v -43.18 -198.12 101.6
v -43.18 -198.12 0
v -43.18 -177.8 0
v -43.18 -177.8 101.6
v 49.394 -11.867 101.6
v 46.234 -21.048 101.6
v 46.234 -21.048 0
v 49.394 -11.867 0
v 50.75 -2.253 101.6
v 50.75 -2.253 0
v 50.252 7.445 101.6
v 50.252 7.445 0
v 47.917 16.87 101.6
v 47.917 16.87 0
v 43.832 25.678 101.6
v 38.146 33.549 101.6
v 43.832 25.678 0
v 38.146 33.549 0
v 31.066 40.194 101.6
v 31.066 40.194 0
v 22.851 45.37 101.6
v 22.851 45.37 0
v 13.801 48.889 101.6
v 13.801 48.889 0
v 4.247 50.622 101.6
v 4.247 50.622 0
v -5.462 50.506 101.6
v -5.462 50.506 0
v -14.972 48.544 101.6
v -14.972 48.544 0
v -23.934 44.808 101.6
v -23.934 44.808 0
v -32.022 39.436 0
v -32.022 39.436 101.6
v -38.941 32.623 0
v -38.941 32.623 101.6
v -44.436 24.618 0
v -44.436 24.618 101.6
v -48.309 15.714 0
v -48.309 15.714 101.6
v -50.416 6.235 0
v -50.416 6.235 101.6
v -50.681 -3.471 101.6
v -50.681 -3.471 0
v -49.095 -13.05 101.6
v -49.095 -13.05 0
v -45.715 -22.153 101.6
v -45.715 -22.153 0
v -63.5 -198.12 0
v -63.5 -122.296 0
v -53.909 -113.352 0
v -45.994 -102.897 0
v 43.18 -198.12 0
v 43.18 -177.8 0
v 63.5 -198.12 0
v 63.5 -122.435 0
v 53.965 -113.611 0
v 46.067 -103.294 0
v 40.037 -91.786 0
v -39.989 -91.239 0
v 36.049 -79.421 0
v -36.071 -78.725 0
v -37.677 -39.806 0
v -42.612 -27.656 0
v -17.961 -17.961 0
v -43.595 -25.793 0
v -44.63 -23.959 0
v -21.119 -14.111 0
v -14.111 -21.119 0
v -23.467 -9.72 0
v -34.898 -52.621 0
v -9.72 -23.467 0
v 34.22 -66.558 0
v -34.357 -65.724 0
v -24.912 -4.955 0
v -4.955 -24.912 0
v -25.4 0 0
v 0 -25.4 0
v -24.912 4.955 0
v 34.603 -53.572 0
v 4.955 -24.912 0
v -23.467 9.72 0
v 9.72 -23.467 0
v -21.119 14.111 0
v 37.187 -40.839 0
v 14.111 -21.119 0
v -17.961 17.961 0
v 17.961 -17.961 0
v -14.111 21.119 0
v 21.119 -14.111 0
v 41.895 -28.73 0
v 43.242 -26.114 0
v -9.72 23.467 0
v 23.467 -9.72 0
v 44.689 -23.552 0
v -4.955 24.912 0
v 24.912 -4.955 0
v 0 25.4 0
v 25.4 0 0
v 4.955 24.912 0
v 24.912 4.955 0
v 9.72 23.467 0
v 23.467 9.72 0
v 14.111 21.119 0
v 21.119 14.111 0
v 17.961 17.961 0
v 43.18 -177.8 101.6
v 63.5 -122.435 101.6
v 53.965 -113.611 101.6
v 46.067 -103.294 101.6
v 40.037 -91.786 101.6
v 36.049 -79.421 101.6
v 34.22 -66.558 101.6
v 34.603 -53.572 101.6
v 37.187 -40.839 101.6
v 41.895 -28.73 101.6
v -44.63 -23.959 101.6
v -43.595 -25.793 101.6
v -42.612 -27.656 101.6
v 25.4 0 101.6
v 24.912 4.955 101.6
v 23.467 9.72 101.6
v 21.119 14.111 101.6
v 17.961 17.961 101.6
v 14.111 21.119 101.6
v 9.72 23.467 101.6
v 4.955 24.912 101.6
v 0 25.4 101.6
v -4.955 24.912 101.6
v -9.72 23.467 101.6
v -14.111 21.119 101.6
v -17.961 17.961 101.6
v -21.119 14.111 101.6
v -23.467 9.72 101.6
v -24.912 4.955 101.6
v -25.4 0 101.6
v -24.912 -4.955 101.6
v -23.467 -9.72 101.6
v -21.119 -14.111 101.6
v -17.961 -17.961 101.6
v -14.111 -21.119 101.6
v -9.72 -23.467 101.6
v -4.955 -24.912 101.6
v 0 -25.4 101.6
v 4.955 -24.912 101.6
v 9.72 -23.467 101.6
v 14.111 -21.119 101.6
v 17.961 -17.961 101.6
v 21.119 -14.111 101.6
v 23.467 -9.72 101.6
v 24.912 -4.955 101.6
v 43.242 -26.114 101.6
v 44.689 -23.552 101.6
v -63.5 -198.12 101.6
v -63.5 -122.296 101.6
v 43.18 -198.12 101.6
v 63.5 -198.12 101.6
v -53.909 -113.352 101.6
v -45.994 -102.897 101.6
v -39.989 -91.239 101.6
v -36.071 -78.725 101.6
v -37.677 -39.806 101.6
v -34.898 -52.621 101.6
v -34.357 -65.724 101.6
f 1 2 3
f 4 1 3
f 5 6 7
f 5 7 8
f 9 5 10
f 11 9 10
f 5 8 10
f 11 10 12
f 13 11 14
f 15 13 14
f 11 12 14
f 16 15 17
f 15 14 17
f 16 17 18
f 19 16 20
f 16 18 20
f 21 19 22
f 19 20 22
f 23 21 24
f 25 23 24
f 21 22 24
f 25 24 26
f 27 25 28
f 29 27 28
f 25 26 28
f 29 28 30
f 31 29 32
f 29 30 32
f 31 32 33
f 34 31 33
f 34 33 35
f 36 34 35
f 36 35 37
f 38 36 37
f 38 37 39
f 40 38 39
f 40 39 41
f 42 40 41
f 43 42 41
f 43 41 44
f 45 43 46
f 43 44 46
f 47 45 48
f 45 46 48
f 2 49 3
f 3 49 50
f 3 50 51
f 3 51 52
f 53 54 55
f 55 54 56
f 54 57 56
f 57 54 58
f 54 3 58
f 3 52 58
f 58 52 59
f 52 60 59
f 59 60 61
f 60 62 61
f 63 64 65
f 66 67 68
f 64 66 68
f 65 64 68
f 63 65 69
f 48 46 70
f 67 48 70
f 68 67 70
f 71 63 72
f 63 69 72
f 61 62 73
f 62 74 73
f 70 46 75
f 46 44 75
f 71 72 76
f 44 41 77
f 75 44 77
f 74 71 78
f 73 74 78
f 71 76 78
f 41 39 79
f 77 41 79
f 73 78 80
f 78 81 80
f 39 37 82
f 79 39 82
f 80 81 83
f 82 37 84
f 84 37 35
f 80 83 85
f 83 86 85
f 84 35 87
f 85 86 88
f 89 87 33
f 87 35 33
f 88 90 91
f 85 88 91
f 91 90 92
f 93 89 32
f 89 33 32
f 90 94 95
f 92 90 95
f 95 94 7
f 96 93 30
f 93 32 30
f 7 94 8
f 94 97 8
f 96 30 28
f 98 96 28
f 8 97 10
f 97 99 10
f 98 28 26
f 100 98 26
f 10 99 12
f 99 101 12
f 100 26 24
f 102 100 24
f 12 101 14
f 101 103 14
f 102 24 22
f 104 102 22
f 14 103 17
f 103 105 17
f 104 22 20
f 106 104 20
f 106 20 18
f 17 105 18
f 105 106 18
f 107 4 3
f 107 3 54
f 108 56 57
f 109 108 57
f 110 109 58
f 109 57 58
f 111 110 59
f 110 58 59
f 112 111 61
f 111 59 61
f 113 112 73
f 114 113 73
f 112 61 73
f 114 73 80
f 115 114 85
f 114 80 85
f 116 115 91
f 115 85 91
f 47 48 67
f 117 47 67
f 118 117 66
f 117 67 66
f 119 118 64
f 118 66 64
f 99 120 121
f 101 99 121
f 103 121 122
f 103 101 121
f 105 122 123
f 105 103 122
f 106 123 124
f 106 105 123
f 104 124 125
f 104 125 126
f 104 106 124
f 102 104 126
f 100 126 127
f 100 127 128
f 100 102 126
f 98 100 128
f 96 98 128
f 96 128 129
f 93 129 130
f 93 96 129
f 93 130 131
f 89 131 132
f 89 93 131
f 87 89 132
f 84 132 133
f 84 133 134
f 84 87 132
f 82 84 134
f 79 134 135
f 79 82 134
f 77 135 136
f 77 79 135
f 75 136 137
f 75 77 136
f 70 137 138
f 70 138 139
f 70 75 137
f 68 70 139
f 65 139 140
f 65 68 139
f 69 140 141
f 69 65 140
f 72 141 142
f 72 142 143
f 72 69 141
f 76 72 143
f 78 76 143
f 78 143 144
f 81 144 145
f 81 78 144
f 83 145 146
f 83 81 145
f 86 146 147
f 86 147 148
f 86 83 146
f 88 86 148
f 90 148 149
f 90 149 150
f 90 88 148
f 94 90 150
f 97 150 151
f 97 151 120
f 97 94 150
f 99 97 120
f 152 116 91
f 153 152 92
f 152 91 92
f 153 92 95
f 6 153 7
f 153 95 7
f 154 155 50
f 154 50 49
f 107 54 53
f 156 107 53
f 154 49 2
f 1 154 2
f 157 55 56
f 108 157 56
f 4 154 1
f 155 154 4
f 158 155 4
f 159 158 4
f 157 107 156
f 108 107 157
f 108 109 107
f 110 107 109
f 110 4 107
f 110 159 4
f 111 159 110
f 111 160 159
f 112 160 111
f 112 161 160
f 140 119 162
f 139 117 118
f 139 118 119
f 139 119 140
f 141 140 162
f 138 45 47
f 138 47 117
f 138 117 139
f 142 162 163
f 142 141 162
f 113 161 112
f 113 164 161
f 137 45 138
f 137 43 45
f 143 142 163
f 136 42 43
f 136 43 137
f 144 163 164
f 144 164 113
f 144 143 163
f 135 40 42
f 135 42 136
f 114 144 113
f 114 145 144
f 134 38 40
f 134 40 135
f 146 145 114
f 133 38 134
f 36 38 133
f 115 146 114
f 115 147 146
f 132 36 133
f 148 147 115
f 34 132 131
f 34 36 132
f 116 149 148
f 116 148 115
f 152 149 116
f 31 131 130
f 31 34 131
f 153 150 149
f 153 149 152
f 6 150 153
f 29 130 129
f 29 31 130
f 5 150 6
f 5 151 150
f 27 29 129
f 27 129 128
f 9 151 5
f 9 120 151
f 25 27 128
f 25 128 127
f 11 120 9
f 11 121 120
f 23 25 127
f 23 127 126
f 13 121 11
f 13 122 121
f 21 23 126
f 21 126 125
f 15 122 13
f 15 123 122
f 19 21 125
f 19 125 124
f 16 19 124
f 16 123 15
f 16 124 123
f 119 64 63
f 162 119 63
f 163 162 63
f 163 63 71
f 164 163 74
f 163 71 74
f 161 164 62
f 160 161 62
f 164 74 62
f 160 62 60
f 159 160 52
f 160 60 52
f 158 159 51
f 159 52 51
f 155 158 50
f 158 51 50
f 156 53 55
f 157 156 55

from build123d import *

# Parameters (mm, degrees)
SKETCH1_R           = 25.4
BOSS_EXTRUDE1_DEPTH = 101.6


with BuildPart() as part:
    # Sketch1 → Boss-Extrude1 (new body)
    with BuildSketch(Plane.XY):
        with BuildLine():
            Line((43.18, -177.8), (43.18, -198.12))
            Line((43.18, -198.12), (63.5, -198.12))
            Line((63.5, -198.12), (63.5, -122.435433935))
            ThreePointArc((63.5, -122.435433935), (36.049391603, -79.421078062), (41.89548787, -28.729916397))
            ThreePointArc((41.89548787, -28.729916397), (43.95358505, -24.826361045), (46.234198191, -21.048489675))
            ThreePointArc((46.234198191, -21.048489675), (-0.610127533, 50.796335935), (-45.715295245, -22.152918107))
            ThreePointArc((-45.715295245, -22.152918107), (-44.106525914, -24.87240035), (-42.611881246, -27.65623938))
            ThreePointArc((-42.611881246, -27.65623938), (-36.071200921, -78.724738597), (-63.5, -122.295750663))
            Line((-63.5, -122.295750663), (-63.5, -198.12))
            Line((-63.5, -198.12), (-43.18, -198.12))
            Line((-43.18, -198.12), (-43.18, -177.8))
            Line((-43.18, -177.8), (43.18, -177.8))
        make_face()
        Circle(SKETCH1_R, mode=Mode.SUBTRACT)
    extrude(amount=BOSS_EXTRUDE1_DEPTH)


solid = part.part
